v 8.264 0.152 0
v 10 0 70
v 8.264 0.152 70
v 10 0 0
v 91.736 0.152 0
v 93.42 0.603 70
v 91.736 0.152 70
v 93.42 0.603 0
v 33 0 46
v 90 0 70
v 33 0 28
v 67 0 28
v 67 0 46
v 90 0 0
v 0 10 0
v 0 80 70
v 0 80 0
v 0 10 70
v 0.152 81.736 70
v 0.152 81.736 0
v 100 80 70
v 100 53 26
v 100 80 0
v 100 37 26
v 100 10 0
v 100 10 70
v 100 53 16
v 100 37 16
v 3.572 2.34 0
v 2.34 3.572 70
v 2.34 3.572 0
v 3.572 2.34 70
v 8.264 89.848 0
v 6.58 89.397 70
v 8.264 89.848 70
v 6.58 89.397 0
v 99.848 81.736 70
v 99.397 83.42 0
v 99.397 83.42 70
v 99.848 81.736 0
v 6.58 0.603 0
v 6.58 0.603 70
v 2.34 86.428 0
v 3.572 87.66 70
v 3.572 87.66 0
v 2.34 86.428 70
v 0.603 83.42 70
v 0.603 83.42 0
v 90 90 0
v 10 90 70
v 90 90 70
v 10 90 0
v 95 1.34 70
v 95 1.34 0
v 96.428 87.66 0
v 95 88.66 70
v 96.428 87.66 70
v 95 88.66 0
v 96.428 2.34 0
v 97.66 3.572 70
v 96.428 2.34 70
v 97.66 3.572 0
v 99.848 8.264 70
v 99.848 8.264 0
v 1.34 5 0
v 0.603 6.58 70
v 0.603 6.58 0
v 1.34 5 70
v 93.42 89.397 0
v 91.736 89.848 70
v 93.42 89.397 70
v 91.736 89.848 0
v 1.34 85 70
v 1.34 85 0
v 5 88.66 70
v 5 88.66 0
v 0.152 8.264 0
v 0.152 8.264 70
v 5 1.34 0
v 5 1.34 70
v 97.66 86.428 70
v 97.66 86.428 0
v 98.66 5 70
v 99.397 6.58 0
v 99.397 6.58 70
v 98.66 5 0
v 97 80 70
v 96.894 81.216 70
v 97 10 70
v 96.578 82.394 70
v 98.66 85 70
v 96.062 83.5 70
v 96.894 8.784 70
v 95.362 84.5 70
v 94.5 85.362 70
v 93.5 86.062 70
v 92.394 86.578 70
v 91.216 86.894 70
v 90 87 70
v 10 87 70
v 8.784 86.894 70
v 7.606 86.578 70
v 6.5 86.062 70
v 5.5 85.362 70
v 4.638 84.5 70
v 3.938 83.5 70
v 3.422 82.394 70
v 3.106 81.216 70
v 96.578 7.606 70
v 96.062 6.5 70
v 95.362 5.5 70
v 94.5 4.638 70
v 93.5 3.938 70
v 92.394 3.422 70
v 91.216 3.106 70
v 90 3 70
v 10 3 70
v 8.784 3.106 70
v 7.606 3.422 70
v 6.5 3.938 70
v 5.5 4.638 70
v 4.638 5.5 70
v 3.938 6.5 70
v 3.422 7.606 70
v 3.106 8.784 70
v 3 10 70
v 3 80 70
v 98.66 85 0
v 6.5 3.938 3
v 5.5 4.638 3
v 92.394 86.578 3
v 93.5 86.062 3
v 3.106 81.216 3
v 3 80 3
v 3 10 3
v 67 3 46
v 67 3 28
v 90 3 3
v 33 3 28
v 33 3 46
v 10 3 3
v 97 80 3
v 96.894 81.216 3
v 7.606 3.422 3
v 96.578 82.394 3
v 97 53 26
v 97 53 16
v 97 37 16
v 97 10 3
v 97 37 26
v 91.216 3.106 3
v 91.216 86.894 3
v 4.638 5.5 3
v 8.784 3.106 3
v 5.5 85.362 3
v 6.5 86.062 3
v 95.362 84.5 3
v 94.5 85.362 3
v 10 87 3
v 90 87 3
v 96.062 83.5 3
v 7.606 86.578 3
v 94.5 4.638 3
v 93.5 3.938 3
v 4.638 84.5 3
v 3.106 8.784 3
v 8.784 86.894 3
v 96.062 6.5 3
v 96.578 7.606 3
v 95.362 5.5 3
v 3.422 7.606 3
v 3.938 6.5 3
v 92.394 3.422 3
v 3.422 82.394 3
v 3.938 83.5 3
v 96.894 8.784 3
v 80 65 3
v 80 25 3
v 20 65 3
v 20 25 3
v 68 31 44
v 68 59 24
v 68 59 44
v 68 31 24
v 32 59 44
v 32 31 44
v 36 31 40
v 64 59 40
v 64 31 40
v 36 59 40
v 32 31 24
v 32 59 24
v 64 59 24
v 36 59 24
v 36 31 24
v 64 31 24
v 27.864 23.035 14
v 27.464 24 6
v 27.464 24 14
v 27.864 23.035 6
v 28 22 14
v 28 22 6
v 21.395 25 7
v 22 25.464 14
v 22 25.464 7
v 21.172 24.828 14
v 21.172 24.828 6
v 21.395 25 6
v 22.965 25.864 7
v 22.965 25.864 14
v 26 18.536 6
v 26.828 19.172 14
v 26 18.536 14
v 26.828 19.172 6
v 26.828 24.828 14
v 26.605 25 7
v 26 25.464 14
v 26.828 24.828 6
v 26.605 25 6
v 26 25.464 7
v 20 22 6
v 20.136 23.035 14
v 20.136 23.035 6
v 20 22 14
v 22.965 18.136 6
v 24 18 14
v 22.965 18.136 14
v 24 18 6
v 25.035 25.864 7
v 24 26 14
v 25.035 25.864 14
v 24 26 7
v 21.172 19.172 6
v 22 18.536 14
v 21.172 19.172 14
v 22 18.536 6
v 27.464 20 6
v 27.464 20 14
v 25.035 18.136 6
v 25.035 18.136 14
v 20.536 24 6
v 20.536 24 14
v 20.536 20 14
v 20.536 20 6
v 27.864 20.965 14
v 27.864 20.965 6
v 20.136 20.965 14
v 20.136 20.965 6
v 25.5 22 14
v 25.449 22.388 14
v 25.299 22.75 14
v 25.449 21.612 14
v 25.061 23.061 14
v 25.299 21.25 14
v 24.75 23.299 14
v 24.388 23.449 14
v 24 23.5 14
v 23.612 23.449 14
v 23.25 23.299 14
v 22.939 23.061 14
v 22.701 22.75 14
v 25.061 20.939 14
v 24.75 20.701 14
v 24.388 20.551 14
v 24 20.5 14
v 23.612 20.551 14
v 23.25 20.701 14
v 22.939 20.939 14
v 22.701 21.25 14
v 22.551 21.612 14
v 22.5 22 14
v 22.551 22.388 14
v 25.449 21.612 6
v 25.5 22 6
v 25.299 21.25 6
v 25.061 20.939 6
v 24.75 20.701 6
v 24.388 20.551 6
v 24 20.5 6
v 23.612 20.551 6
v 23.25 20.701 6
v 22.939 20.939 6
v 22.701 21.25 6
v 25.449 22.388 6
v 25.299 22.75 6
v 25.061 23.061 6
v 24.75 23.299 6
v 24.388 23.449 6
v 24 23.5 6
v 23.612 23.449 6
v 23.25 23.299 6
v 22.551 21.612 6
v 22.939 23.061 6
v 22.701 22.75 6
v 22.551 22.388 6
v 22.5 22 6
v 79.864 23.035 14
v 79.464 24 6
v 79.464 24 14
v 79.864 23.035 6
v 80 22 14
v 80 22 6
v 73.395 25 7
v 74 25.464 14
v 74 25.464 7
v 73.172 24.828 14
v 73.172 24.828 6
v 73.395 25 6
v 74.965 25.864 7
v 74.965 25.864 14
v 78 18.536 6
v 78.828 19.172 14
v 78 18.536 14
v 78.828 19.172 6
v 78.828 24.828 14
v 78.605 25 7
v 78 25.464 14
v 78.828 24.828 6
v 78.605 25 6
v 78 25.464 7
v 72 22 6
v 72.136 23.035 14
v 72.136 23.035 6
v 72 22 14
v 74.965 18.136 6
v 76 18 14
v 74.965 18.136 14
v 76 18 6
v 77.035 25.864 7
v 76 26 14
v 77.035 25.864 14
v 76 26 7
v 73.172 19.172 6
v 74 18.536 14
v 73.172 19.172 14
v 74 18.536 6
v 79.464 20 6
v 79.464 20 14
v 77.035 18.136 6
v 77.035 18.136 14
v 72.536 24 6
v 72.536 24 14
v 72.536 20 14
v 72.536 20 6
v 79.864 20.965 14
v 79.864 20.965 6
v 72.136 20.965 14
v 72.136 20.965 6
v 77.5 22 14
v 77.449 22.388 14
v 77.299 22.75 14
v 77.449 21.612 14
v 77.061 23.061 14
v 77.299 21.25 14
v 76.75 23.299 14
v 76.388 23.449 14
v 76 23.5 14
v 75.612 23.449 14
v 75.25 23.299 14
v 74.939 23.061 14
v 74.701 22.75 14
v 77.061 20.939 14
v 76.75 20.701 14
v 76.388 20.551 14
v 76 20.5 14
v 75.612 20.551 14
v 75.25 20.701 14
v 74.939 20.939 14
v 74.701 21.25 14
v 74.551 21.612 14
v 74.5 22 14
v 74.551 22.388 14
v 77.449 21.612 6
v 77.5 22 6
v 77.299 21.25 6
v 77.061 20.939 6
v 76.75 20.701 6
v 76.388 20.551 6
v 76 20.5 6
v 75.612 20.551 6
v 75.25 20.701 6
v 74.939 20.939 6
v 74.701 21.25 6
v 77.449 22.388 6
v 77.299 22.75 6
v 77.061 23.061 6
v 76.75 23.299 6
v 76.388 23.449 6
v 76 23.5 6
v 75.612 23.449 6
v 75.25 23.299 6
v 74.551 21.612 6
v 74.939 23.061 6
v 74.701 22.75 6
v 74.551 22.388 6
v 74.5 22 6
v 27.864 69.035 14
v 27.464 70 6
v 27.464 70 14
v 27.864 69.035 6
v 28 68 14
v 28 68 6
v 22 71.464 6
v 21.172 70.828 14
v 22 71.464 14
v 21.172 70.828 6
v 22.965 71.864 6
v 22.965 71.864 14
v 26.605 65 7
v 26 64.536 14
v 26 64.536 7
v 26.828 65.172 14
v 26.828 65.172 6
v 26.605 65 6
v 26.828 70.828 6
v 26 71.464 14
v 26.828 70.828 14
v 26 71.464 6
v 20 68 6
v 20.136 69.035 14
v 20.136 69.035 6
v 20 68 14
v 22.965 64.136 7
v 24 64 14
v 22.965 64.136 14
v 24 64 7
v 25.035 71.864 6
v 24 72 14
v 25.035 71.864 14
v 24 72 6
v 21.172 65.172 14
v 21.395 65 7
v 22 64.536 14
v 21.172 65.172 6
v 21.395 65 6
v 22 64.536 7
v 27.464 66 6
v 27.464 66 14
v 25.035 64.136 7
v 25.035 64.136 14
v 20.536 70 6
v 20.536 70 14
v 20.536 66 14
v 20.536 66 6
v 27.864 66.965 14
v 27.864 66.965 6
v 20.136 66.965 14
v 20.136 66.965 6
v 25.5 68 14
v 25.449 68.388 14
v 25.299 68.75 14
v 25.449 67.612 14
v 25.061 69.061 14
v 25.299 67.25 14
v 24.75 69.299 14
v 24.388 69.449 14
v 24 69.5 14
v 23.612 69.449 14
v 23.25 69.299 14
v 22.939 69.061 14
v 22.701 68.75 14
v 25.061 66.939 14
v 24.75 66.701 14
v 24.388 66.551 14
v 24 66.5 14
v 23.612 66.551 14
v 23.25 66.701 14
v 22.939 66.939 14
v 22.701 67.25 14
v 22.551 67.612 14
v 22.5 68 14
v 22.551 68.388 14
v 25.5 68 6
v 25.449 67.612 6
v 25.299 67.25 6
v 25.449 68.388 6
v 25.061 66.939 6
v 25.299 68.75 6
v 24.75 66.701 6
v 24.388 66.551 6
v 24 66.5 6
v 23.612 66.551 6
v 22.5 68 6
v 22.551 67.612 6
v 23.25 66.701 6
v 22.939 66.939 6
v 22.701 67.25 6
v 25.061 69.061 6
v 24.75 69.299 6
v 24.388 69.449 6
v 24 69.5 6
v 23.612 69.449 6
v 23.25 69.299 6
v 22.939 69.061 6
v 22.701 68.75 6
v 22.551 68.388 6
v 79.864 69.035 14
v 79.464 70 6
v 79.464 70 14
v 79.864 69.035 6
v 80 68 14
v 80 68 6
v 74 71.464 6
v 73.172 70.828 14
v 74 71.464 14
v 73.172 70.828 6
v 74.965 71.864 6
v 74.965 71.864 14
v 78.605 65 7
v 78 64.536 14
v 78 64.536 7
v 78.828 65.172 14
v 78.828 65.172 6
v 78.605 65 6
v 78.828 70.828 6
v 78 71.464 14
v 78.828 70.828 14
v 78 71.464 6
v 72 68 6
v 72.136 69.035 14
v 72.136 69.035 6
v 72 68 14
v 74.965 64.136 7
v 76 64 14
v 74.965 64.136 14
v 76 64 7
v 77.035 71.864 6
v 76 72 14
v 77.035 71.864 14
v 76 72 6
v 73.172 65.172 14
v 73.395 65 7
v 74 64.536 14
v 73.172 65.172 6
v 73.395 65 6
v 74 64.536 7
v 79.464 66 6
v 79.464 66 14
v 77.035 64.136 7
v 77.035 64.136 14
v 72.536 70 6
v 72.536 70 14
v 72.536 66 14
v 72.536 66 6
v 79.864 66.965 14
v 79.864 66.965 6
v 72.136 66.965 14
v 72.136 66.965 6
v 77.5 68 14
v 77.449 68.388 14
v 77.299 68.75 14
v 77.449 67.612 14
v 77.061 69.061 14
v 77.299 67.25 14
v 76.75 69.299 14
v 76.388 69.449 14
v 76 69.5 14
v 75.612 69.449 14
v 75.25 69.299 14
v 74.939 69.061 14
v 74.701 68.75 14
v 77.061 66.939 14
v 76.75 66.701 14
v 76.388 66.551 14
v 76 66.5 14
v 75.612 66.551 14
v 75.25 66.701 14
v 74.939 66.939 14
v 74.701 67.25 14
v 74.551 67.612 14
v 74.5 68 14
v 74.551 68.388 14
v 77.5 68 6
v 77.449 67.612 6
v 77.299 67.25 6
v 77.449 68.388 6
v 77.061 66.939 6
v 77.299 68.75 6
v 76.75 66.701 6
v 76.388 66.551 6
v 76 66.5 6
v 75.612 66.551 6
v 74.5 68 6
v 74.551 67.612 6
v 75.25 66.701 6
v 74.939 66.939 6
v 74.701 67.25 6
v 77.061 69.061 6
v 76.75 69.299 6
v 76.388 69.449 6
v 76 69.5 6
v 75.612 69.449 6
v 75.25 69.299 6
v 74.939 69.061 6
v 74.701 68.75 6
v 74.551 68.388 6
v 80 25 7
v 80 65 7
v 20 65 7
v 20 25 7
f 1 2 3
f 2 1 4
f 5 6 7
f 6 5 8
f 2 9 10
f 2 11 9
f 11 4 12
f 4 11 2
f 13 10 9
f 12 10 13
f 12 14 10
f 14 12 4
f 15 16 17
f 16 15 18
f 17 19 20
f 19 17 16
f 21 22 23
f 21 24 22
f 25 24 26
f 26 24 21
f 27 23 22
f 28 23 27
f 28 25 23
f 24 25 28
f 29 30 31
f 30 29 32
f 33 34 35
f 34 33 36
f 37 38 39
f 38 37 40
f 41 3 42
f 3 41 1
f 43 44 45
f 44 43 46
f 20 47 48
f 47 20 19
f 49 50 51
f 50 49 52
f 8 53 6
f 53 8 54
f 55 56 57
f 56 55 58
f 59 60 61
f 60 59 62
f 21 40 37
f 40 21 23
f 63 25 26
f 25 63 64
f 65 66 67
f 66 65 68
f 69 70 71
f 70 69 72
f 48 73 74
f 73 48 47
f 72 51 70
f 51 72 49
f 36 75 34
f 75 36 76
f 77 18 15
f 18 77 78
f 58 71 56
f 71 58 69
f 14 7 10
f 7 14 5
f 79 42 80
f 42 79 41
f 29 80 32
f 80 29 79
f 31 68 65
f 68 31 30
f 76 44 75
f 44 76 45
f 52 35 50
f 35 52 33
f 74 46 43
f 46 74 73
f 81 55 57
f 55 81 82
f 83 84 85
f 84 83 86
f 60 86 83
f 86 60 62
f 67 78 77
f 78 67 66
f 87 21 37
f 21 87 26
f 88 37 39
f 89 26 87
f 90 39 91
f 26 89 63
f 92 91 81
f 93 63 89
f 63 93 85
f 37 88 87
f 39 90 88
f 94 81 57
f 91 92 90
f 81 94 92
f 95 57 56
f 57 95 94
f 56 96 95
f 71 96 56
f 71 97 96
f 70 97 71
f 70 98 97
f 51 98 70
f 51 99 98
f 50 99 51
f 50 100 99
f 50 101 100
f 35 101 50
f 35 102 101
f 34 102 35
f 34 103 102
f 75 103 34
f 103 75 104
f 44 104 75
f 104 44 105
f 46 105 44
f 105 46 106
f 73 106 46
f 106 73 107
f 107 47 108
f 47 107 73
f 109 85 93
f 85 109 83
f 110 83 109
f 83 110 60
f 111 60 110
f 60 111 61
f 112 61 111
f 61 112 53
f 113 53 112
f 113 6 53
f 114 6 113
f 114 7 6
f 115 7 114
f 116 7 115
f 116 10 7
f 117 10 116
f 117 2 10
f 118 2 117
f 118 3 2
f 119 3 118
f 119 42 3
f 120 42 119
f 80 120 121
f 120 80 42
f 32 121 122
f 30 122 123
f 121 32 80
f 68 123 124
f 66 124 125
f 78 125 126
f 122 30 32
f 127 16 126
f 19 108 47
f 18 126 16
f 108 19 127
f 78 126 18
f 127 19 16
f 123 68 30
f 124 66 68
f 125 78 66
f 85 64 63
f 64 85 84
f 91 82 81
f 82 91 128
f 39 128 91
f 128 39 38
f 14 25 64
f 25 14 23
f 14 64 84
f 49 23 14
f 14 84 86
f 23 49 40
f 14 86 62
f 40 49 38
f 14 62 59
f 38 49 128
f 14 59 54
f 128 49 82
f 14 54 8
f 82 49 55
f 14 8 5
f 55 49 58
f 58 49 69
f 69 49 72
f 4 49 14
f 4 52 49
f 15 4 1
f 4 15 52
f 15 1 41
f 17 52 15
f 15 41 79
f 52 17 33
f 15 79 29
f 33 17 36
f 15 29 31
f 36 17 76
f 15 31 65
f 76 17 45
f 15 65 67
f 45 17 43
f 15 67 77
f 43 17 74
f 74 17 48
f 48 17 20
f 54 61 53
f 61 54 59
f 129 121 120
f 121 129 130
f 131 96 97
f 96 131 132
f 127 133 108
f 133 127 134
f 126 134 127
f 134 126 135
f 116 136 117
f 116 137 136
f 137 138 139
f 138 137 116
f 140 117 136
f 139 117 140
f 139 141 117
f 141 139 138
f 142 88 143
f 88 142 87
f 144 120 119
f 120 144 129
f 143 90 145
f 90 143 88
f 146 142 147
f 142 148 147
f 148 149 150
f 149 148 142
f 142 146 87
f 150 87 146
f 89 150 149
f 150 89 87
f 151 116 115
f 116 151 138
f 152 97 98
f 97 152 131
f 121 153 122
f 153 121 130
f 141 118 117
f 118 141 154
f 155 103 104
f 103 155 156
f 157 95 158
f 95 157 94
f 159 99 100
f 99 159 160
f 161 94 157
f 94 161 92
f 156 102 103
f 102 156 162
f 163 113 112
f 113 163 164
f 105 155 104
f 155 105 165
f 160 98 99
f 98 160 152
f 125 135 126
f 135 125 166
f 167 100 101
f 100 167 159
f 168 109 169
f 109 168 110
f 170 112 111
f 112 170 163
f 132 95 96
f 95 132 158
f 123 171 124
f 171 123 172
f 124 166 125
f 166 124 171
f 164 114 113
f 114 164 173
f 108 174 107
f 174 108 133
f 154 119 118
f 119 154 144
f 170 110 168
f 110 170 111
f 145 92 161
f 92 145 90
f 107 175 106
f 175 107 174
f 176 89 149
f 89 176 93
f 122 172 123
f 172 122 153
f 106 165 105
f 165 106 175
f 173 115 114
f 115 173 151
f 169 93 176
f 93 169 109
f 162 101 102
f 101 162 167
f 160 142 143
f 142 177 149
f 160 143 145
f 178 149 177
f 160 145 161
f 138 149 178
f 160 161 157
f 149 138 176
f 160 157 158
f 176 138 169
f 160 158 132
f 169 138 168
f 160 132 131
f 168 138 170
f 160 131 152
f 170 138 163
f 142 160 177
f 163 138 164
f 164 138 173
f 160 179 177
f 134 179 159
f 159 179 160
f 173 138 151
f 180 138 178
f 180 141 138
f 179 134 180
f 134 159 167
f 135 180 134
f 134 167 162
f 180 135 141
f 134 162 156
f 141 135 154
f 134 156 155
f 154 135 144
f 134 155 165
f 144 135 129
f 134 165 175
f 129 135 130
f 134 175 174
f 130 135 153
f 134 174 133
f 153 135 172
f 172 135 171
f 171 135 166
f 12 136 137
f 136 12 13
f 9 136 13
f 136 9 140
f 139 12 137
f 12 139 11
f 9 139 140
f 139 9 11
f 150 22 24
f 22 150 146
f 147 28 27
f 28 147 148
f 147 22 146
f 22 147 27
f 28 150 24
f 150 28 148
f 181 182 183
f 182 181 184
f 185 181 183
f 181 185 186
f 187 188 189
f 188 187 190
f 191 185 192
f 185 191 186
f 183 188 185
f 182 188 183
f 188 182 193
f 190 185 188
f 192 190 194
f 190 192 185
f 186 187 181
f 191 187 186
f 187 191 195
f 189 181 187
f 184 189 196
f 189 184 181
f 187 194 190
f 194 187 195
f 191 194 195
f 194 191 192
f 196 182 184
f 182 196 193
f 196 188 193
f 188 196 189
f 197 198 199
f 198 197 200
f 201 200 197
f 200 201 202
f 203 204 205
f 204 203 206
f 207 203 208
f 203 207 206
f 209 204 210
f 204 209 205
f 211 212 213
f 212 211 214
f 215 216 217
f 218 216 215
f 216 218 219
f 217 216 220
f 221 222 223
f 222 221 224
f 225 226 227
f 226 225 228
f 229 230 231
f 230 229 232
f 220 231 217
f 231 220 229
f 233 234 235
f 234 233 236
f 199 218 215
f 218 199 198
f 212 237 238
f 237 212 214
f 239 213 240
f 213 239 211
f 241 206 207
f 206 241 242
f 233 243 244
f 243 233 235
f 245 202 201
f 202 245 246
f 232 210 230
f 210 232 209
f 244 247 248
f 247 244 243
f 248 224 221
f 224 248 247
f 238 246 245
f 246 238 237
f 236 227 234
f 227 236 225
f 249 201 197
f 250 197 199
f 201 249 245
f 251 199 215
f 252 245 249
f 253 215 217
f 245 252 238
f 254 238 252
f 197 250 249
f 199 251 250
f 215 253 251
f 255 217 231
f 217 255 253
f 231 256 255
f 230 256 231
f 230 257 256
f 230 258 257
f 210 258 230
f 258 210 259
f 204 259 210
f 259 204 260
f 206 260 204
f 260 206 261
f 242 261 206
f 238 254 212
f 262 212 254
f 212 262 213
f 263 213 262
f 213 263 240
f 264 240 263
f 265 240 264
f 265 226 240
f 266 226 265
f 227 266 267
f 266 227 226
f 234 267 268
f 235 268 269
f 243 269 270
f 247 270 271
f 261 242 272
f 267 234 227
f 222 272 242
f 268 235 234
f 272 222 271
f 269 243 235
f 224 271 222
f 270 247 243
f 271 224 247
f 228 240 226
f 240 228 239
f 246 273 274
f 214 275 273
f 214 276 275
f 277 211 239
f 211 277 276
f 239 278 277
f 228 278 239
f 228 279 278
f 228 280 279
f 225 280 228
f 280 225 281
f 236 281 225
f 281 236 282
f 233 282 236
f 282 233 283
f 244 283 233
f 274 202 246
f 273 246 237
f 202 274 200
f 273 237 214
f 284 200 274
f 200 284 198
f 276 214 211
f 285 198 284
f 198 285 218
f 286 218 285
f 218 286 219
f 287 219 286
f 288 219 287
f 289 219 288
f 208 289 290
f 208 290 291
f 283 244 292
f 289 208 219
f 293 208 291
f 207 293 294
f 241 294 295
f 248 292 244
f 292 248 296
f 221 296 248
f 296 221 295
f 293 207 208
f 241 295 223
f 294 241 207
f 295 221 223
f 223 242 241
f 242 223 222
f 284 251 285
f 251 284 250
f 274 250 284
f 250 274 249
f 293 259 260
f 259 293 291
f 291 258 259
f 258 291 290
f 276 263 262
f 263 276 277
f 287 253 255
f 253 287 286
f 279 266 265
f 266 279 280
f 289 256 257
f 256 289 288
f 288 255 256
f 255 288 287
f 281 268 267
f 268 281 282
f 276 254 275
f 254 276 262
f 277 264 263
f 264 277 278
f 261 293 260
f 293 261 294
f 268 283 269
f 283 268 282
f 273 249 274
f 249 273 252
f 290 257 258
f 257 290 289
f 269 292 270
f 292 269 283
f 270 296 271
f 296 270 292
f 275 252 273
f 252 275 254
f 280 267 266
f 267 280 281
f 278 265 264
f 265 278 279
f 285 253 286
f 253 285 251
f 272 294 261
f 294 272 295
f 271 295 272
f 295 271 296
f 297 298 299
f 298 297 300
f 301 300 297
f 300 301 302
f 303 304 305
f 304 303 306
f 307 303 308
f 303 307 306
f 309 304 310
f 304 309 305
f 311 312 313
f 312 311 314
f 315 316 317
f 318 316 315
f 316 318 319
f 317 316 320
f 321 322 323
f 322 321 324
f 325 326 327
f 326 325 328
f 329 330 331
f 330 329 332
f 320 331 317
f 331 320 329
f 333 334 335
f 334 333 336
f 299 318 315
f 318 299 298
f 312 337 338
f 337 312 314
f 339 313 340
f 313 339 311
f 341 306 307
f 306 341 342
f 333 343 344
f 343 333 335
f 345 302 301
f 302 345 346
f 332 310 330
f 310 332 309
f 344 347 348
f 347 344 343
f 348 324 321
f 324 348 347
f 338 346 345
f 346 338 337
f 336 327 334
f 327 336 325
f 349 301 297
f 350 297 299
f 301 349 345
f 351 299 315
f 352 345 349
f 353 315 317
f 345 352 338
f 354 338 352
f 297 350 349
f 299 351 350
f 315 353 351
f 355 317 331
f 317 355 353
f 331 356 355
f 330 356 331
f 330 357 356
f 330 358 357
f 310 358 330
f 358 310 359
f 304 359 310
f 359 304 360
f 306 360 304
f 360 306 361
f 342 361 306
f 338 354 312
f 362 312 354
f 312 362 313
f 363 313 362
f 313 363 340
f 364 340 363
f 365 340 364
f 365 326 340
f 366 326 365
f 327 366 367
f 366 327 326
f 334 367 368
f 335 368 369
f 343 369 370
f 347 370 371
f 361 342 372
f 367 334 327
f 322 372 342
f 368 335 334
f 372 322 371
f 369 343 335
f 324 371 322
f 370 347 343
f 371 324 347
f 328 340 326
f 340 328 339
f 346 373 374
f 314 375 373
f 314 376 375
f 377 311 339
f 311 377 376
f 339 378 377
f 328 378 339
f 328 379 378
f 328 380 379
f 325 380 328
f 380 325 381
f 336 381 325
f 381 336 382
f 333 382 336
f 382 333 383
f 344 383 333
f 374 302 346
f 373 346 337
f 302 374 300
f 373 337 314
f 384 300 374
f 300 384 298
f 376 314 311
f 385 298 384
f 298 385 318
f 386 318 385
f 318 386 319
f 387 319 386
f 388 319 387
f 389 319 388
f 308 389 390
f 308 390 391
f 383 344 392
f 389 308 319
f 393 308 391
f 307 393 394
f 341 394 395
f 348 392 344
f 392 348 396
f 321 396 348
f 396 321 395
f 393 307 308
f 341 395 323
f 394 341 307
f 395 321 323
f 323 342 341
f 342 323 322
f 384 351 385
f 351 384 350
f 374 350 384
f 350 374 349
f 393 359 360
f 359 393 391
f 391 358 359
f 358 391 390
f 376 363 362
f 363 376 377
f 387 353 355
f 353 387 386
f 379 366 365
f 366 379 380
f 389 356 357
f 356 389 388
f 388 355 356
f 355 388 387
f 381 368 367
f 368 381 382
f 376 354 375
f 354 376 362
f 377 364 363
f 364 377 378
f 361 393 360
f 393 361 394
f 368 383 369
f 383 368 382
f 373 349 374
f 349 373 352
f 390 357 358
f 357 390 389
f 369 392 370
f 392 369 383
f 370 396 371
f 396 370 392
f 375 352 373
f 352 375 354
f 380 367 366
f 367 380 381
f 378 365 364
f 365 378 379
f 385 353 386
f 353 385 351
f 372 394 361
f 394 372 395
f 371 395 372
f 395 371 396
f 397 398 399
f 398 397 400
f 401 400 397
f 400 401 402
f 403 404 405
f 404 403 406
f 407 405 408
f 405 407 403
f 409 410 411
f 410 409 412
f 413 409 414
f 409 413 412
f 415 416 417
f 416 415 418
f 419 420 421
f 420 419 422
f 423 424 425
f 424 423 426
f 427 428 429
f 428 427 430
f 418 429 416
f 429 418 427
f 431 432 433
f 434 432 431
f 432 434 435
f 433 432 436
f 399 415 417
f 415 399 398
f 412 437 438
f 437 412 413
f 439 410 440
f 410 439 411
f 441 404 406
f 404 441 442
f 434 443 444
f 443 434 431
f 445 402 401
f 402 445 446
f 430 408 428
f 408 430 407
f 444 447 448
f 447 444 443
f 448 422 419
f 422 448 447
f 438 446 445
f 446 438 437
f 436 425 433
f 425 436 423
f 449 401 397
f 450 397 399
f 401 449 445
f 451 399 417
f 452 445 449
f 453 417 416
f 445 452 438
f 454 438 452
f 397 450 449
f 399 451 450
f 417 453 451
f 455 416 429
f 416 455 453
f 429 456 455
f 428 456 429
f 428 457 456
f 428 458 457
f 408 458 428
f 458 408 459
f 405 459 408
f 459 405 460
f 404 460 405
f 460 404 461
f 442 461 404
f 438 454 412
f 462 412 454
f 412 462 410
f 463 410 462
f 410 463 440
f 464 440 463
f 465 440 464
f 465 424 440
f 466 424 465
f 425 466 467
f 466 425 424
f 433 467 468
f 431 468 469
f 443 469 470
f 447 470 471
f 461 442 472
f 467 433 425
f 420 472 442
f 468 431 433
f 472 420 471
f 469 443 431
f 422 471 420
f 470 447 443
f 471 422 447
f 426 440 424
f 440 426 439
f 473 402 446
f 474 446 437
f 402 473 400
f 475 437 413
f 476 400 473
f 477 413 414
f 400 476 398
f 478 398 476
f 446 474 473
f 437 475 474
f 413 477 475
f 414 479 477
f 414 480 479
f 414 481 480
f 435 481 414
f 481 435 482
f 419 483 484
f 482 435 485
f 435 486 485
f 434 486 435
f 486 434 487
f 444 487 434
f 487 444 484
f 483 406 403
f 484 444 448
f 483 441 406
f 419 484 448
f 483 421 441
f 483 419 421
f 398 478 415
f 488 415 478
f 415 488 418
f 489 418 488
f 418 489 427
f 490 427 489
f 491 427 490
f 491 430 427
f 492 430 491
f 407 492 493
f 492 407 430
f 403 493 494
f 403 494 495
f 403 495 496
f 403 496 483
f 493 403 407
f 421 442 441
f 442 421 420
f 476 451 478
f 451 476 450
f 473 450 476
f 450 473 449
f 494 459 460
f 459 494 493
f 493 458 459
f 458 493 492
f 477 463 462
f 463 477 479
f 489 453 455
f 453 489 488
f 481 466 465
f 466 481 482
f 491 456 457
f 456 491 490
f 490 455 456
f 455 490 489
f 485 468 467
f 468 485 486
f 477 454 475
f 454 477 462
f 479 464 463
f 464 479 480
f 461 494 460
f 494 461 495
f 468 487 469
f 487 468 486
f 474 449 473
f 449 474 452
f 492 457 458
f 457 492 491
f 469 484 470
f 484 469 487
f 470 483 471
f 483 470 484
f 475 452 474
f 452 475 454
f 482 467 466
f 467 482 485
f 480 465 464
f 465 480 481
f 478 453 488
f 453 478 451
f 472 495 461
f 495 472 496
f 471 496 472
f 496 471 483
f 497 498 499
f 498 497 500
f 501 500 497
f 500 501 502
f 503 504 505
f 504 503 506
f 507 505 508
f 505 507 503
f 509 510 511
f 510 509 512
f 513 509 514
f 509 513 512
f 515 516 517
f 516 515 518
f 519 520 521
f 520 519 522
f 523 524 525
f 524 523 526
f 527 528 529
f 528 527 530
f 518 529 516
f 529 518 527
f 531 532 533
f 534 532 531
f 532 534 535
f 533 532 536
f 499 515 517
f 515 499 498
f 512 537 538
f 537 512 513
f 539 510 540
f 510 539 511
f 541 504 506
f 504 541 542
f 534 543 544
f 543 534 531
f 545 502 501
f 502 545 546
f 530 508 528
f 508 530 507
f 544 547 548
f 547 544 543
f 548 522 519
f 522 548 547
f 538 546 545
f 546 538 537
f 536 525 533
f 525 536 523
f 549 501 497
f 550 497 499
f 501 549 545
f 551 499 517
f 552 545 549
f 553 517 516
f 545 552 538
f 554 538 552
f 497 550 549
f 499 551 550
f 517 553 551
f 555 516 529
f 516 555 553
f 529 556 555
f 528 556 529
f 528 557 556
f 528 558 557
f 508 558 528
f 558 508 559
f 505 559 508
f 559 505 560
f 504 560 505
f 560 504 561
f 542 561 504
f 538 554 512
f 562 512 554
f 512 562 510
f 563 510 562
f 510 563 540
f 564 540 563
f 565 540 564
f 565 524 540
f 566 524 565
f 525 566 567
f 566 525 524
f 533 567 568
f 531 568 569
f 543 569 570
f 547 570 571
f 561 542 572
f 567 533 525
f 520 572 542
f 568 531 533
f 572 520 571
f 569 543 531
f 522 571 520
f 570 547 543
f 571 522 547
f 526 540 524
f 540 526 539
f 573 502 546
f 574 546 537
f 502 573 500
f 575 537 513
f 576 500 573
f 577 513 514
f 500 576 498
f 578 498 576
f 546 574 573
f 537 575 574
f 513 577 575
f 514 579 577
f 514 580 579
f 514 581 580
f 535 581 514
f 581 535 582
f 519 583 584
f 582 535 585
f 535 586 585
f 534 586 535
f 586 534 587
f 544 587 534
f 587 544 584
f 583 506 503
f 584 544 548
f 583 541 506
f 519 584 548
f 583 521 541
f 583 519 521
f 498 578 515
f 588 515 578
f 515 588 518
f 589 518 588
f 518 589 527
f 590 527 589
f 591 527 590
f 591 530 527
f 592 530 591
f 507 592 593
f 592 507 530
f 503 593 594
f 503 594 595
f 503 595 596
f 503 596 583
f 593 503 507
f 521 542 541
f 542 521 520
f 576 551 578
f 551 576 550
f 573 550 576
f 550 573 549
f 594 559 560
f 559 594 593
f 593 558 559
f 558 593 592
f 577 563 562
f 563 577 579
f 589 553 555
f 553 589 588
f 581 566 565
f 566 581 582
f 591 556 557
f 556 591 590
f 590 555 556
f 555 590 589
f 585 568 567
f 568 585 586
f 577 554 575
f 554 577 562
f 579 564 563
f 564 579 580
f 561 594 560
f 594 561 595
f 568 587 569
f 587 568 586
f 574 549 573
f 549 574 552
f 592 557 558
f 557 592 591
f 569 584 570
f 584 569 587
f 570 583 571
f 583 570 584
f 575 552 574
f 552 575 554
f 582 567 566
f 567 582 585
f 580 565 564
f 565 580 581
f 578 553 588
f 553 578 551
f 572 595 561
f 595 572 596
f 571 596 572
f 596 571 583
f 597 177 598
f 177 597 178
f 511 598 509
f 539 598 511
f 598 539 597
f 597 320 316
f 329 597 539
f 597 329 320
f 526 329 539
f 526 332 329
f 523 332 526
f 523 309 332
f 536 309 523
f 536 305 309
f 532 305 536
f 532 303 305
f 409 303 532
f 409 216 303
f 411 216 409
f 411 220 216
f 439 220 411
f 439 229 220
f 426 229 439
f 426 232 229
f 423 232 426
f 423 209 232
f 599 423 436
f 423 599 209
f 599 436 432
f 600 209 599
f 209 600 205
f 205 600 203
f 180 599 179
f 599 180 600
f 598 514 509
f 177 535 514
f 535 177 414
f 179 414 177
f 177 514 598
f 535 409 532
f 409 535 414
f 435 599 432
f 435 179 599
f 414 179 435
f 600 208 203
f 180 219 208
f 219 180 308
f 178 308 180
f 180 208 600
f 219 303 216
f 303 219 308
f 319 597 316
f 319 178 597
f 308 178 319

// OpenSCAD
body_length = 100;
body_width = 90;
body_height = 70;
wall = 3;
corner_r = 10;

sensor_window = [34, 4, 18];
usb_window = [12, 16, 10];

module rounded_box(x, y, z, r) {
    hull() {
        translate([r, r, 0]) cylinder(h = z, r = r, $fn = 36);
        translate([x - r, r, 0]) cylinder(h = z, r = r, $fn = 36);
        translate([r, y - r, 0]) cylinder(h = z, r = r, $fn = 36);
        translate([x - r, y - r, 0]) cylinder(h = z, r = r, $fn = 36);
    }
}

module shell_body() {
    difference() {
        rounded_box(body_length, body_width, body_height, corner_r);

        translate([wall, wall, wall])
            rounded_box(
                body_length - 2 * wall,
                body_width - 2 * wall,
                body_height - wall,
                corner_r - 3
            );

        translate([
            body_length / 2 - sensor_window[0] / 2,
            -1,
            28
        ]) cube(sensor_window);

        translate([
            body_length - wall - 1,
            body_width / 2 - usb_window[1] / 2,
            16
        ]) cube(usb_window);

        translate([body_length / 2, body_width / 2, body_height - 1])
            cylinder(h = 4, d = 12, $fn = 36);
    }
}

module servo_platform() {
    translate([32, 31, 40]) cube([36, 28, 4]);
    translate([32, 31, 24]) cube([4, 28, 16]);
    translate([64, 31, 24]) cube([4, 28, 16]);
}

module pcb_standoffs() {
    for (p = [[24, 22], [76, 22], [24, 68], [76, 68]]) {
        translate([p[0], p[1], 6])
            difference() {
                cylinder(h = 8, d = 8, $fn = 24);
                cylinder(h = 8, d = 3, $fn = 24);
            }
    }
}

module battery_tray() {
    translate([20, 25, 3]) cube([60, 40, 4]);
}

shell_body();
servo_platform();
pcb_standoffs();
battery_tray();
